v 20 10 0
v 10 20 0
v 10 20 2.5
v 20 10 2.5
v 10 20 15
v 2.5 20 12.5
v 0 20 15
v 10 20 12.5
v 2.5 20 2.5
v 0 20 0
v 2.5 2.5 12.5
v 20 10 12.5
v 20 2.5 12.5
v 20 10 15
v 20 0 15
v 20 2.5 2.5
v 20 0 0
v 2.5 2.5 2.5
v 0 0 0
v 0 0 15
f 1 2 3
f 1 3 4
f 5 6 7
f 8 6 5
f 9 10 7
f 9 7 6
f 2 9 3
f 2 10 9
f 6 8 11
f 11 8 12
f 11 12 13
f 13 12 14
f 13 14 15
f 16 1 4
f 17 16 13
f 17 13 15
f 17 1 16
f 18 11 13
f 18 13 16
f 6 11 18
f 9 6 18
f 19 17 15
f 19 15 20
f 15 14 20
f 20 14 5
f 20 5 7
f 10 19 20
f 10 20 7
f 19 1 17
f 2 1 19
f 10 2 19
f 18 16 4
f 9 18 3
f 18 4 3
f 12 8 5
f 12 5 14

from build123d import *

# Parameters (mm, degrees)
BOSS_EXTRUDE1_DEPTH = 15
SKETCH2_W           = 10
SKETCH2_H           = 2.5
SKETCH2_H_2         = 7.5
CUT_EXTRUDE2_DEPTH  = 17.5


with BuildPart() as part:
    # Sketch1 → Boss-Extrude1 (new body)
    with BuildSketch(Plane.XY):
        Polygon((0, 0), (0, 20), (10, 20), (20, 10), (20, 0), align=None)
    extrude(amount=BOSS_EXTRUDE1_DEPTH)

    # Sketch2 → Cut-Extrude2 (cut)
    with BuildSketch(Plane(origin=(20, 0, 0), x_dir=(0, 0, -1), z_dir=(1, 0, 0))):
        with Locations((-7.5, 18.75)):
            Rectangle(SKETCH2_W, SKETCH2_H)
        with Locations((-7.5, 13.75)):
            Rectangle(SKETCH2_W, SKETCH2_H_2)
        with Locations((-7.5, 6.25)):
            Rectangle(SKETCH2_W, SKETCH2_H_2)
    extrude(amount=-CUT_EXTRUDE2_DEPTH, mode=Mode.SUBTRACT)


solid = part.part
